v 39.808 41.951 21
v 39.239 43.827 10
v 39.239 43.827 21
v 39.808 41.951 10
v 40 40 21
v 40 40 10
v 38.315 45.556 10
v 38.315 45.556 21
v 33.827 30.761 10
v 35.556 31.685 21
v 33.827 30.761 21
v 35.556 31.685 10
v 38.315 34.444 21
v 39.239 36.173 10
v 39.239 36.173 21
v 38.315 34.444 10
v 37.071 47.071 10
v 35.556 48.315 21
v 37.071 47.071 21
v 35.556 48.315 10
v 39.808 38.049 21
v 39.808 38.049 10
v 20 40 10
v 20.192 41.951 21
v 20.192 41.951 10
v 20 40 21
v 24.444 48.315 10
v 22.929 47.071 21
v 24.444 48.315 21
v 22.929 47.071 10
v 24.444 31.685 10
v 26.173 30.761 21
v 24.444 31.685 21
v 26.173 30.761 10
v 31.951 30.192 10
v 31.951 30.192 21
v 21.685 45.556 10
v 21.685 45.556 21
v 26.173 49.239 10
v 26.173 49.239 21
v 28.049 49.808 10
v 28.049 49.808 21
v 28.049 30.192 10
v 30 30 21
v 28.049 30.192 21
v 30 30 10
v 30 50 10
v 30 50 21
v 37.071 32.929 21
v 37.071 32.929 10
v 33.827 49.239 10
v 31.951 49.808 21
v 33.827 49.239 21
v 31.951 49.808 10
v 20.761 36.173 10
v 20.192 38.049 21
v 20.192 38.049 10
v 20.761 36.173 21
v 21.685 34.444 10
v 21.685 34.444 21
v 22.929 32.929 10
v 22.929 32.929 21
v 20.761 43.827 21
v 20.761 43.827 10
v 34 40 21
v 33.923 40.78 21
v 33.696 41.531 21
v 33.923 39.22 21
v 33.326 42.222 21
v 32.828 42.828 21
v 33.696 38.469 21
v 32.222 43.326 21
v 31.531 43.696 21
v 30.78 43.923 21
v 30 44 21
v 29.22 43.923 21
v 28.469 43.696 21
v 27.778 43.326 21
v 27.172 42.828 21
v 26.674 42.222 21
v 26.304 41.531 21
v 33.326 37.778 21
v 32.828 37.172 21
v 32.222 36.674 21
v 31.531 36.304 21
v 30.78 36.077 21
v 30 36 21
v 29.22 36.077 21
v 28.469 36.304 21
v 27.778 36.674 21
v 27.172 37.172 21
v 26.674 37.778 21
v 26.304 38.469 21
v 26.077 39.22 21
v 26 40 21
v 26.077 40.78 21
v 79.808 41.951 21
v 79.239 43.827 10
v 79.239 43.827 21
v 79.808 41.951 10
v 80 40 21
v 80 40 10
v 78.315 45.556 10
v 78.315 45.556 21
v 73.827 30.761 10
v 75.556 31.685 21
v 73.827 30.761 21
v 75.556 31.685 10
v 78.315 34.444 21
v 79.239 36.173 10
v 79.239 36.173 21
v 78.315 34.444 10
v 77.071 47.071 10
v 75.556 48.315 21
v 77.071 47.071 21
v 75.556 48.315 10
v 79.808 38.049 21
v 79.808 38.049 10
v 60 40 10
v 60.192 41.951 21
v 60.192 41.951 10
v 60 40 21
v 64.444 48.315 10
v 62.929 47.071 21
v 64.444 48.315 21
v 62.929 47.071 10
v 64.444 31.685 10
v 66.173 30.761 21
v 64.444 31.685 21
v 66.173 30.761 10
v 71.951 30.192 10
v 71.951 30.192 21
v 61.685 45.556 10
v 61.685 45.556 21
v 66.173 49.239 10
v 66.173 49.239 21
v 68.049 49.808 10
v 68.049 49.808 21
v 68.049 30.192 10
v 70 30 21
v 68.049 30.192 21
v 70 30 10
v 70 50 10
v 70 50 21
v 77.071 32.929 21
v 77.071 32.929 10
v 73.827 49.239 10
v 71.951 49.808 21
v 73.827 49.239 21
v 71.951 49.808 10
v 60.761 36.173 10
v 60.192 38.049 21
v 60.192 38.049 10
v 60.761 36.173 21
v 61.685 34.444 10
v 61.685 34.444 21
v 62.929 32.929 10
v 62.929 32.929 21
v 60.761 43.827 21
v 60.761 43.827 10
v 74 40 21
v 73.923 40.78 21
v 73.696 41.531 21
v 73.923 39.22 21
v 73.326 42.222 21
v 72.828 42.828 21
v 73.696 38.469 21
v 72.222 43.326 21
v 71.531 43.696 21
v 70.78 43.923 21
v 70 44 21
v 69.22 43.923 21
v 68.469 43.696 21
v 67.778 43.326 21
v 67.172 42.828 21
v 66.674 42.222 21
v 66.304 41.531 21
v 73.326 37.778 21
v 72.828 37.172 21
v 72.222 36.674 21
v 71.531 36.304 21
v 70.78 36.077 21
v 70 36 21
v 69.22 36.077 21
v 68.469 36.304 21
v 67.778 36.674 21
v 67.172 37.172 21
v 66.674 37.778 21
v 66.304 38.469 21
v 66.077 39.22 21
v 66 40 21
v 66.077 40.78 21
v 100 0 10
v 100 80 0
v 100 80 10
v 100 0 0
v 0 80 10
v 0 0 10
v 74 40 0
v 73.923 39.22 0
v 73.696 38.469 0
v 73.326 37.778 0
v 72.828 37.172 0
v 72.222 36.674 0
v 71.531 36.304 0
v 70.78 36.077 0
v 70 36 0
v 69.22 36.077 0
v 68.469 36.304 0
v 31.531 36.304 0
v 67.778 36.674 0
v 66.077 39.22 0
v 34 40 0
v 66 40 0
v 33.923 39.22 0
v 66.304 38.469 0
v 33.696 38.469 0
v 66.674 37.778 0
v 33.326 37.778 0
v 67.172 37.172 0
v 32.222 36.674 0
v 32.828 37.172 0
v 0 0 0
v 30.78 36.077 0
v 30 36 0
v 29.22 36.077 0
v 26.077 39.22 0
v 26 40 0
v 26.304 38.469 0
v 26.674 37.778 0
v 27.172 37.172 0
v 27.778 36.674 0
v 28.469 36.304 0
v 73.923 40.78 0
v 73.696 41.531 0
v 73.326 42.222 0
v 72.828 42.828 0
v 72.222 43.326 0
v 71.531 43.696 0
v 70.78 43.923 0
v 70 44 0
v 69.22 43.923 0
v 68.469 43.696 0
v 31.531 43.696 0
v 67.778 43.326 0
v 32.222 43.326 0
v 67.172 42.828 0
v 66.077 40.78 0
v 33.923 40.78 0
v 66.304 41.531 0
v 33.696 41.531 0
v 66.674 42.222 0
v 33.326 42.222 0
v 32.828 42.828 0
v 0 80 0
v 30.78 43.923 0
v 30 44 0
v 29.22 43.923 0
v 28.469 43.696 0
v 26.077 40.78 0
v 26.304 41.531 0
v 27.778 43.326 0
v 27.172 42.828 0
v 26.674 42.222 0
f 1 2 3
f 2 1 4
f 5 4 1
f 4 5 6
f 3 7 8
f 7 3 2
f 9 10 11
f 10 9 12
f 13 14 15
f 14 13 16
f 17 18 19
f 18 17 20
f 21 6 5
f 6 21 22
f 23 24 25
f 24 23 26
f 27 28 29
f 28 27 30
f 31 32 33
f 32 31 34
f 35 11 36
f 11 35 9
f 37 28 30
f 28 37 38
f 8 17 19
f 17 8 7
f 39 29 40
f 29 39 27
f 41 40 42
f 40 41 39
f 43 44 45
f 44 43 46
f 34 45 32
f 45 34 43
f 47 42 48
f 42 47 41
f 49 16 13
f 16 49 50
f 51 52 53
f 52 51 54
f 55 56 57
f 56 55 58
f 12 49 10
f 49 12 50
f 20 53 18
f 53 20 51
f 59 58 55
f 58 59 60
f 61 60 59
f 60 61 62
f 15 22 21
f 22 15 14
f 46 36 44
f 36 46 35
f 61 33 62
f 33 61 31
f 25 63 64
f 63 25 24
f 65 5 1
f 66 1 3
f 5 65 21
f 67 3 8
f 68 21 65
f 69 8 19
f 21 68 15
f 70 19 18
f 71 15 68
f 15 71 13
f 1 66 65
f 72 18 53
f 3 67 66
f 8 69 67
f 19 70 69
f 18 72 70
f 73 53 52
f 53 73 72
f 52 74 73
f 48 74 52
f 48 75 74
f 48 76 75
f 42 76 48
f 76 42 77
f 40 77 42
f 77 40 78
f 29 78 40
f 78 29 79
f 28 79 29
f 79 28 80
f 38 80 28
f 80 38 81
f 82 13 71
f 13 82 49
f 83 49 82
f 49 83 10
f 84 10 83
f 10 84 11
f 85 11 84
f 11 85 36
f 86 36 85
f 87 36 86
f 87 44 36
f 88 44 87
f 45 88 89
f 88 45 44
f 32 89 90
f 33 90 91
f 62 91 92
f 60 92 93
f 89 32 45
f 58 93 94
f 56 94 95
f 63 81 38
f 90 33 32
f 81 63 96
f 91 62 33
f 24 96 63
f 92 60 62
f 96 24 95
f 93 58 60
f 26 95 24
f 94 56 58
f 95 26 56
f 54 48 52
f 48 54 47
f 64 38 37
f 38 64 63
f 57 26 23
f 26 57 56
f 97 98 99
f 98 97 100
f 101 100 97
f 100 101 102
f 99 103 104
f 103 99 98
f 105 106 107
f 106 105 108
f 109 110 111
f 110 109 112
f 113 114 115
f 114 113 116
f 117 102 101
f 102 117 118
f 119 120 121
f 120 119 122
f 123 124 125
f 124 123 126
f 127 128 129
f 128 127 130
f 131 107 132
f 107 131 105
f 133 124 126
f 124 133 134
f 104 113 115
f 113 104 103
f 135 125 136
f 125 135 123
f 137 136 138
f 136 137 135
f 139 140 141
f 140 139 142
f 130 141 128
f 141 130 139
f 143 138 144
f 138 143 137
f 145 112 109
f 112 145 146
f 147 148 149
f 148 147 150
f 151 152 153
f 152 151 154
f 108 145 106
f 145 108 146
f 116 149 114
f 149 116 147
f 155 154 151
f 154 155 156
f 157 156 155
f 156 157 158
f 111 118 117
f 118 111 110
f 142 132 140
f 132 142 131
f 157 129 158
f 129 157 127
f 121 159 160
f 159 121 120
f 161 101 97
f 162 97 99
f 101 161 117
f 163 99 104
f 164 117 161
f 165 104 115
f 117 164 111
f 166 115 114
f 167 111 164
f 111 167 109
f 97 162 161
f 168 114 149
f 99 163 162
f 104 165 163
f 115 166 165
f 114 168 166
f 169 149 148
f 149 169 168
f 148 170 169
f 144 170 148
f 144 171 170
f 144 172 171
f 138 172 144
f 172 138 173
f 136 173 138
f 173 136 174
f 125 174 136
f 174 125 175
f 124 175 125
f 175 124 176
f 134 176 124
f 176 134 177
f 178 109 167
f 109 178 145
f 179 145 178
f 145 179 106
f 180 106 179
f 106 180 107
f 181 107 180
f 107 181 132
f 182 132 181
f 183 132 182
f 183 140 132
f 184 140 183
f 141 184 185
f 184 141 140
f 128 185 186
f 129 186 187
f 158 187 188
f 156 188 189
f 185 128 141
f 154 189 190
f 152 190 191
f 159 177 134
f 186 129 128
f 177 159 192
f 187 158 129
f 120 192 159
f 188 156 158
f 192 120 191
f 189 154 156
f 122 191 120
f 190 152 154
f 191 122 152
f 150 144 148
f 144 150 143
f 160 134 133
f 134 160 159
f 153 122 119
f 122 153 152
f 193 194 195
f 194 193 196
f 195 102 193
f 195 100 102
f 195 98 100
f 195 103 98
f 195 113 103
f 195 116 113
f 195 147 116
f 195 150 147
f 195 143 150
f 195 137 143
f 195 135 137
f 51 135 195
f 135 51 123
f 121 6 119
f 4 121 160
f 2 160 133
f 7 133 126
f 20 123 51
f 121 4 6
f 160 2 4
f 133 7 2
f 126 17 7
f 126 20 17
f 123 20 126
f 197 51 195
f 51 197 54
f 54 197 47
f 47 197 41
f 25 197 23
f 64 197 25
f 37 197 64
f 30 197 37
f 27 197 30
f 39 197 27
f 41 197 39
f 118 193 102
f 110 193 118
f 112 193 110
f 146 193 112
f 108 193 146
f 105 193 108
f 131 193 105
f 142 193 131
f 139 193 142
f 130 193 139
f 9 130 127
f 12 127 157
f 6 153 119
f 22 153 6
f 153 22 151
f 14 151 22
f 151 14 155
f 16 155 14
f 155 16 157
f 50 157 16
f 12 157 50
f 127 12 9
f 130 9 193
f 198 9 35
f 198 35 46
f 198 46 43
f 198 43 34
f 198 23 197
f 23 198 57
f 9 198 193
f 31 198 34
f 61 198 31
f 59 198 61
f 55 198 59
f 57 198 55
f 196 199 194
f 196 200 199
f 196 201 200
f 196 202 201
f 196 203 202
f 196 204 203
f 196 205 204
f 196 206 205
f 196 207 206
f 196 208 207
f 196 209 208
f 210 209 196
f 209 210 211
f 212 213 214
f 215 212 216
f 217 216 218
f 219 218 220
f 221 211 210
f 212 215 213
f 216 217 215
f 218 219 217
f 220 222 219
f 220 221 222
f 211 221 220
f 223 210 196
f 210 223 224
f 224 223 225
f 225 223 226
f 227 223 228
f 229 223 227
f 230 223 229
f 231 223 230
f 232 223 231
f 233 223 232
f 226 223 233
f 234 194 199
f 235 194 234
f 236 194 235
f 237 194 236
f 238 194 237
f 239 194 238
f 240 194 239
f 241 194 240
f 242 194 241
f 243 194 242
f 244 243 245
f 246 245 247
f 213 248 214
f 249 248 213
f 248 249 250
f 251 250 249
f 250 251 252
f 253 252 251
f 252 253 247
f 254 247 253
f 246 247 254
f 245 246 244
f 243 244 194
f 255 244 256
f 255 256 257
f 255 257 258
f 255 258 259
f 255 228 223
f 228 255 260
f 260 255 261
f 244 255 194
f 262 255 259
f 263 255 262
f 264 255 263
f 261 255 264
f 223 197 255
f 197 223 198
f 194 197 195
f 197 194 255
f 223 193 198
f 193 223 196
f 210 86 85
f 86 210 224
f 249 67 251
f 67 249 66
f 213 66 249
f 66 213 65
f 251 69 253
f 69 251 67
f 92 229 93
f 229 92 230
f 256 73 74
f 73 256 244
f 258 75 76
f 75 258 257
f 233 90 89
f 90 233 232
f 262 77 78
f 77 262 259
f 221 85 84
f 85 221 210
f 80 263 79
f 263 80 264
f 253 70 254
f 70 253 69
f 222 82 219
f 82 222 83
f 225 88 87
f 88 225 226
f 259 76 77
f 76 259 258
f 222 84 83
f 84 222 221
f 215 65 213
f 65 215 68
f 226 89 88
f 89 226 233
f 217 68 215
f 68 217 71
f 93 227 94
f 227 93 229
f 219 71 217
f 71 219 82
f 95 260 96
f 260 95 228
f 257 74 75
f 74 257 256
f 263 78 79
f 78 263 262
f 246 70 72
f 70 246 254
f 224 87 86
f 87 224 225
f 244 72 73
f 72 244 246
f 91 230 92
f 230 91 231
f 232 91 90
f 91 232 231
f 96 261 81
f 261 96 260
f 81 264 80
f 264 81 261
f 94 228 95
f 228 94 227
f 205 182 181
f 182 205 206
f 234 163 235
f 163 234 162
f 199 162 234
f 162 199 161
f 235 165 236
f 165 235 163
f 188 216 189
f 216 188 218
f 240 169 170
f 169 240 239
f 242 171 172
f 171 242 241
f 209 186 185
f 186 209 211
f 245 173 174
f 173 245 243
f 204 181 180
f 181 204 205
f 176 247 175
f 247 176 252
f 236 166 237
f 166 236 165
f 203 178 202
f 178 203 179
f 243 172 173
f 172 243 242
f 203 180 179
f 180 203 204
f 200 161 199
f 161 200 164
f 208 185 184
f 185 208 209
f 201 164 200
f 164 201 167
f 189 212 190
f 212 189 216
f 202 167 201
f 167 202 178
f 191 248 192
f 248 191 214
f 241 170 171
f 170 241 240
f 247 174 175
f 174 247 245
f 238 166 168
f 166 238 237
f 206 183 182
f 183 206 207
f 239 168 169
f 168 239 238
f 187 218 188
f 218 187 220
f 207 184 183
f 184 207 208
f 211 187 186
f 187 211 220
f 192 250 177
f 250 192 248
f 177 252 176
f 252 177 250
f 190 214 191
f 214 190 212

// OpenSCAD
$fn = 32;

// ----------------------------------------------------------------------
// Drill jig: two_boss jig
// ----------------------------------------------------------------------

// --- parameters (mm) ---
plate_l = 100;            // plate length, X
plate_w = 80;             // plate width, Y
plate_t = 10;             // plate thickness
boss_d = 20;              // guide boss diameter
boss_h = 12;              // boss height above the plate
guide_d = 8;              // guide hole diameter
boss_pitch = 40;          // boss pitch

n_boss = 2;  // guide bosses
boss_x0 = (plate_l - (n_boss - 1) * boss_pitch) / 2;  // first boss X
boss_top = plate_t - 1 + boss_h;  // boss crown height
total_h = boss_top;  // overall height

difference() {
  union() {
  cube([plate_l, plate_w, plate_t]);
  for (i = [0 : n_boss - 1])
    translate([boss_x0 + i * boss_pitch, plate_w / 2, plate_t - 1])
      cylinder(h = boss_h, d = boss_d);
  }
  for (i = [0 : n_boss - 1])
    translate([boss_x0 + i * boss_pitch, plate_w / 2, -1])
      cylinder(h = plate_t + boss_h, d = guide_d);
}
